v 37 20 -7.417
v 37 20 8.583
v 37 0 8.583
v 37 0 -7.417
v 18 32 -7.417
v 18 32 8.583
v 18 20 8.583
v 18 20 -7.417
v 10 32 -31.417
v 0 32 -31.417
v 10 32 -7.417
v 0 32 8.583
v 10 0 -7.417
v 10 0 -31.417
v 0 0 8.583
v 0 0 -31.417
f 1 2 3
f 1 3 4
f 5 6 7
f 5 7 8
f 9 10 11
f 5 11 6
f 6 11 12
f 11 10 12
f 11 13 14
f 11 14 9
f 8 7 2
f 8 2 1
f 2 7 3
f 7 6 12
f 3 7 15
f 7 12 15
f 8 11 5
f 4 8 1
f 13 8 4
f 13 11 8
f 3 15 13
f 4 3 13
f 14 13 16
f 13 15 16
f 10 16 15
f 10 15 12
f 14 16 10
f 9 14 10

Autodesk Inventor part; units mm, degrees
ref_plane "YZ Plane" through (0, 0, 0) normal (1, 0, 0) x (0, 1, 0)
ref_plane "XZ Plane" through (0, 0, 0) normal (0, 1, 0) x (-1, 0, 0)
ref_plane "XY Plane" through (0, 0, 0) normal (0, 0, 1) x (1, 0, 0)
sketch "Sketch1" plane through (0, 0, 0) normal (1, 0, 0) x (0, 1, 0)
  point P0 (0, 0)
sketch "Sketch2" plane through (0, 0, 0) normal (1, 0, 0) x (0, 1, 0)
  line L0 (32, 8.5828) -> (0, 8.5828)
  line L1 (0, 8.5828) -> (0, -31.4172)
  line L2 (0, -31.4172) -> (32, -31.4172)
  line L3 (32, -31.4172) -> (32, 8.5828)
  point P0 (0, 0)
  dimension "d0" = 32
  dimension "d1" = 40
extrude "Extrusion1" add sketch "Sketch2" along normal blind 10
sketch "Sketch3" plane through (10, 0, 0) normal (1, 0, 0) x (0, 0, -1)
  point P0 (0, 0)
sketch "Sketch4" plane through (10, 0, 0) normal (1, 0, 0) x (0, 0, -1)
  line L0 (-8.5828, 32) -> (-8.5828, 0) projected
  line L1 (-8.5828, 0) -> (31.4172, 0) projected
  line L2 (-8.5828, 32) -> (7.4172, 32)
  line L3 (7.4172, 32) -> (7.4172, 0)
  line L4 (7.4172, 0) -> (-8.5828, 0)
  line L5 (-8.5828, 0) -> (-8.5828, 32)
  point P0 (0, 0)
  dimension "d4" = 16
extrude "Extrusion2" add sketch "Sketch4" along normal blind 8
sketch "Sketch5" plane through (18, 0, 0) normal (1, 0, 0) x (0, 0, -1)
  line L0 (-8.5828, 32) -> (-8.5828, 0) projected
  line L1 (-8.5828, 0) -> (31.4172, 0) projected
  line L2 (-8.5828, 20) -> (7.4172, 20)
  line L3 (7.4172, 20) -> (7.4172, 0)
  line L4 (7.4172, 0) -> (-8.5828, 0)
  line L5 (-8.5828, 0) -> (-8.5828, 20)
  point P0 (0, 0)
  dimension "d7" = 16
  dimension "d8" = 20
extrude "Extrusion3" add sketch "Sketch5" along normal blind 19
properties part number "lab1ex1"
